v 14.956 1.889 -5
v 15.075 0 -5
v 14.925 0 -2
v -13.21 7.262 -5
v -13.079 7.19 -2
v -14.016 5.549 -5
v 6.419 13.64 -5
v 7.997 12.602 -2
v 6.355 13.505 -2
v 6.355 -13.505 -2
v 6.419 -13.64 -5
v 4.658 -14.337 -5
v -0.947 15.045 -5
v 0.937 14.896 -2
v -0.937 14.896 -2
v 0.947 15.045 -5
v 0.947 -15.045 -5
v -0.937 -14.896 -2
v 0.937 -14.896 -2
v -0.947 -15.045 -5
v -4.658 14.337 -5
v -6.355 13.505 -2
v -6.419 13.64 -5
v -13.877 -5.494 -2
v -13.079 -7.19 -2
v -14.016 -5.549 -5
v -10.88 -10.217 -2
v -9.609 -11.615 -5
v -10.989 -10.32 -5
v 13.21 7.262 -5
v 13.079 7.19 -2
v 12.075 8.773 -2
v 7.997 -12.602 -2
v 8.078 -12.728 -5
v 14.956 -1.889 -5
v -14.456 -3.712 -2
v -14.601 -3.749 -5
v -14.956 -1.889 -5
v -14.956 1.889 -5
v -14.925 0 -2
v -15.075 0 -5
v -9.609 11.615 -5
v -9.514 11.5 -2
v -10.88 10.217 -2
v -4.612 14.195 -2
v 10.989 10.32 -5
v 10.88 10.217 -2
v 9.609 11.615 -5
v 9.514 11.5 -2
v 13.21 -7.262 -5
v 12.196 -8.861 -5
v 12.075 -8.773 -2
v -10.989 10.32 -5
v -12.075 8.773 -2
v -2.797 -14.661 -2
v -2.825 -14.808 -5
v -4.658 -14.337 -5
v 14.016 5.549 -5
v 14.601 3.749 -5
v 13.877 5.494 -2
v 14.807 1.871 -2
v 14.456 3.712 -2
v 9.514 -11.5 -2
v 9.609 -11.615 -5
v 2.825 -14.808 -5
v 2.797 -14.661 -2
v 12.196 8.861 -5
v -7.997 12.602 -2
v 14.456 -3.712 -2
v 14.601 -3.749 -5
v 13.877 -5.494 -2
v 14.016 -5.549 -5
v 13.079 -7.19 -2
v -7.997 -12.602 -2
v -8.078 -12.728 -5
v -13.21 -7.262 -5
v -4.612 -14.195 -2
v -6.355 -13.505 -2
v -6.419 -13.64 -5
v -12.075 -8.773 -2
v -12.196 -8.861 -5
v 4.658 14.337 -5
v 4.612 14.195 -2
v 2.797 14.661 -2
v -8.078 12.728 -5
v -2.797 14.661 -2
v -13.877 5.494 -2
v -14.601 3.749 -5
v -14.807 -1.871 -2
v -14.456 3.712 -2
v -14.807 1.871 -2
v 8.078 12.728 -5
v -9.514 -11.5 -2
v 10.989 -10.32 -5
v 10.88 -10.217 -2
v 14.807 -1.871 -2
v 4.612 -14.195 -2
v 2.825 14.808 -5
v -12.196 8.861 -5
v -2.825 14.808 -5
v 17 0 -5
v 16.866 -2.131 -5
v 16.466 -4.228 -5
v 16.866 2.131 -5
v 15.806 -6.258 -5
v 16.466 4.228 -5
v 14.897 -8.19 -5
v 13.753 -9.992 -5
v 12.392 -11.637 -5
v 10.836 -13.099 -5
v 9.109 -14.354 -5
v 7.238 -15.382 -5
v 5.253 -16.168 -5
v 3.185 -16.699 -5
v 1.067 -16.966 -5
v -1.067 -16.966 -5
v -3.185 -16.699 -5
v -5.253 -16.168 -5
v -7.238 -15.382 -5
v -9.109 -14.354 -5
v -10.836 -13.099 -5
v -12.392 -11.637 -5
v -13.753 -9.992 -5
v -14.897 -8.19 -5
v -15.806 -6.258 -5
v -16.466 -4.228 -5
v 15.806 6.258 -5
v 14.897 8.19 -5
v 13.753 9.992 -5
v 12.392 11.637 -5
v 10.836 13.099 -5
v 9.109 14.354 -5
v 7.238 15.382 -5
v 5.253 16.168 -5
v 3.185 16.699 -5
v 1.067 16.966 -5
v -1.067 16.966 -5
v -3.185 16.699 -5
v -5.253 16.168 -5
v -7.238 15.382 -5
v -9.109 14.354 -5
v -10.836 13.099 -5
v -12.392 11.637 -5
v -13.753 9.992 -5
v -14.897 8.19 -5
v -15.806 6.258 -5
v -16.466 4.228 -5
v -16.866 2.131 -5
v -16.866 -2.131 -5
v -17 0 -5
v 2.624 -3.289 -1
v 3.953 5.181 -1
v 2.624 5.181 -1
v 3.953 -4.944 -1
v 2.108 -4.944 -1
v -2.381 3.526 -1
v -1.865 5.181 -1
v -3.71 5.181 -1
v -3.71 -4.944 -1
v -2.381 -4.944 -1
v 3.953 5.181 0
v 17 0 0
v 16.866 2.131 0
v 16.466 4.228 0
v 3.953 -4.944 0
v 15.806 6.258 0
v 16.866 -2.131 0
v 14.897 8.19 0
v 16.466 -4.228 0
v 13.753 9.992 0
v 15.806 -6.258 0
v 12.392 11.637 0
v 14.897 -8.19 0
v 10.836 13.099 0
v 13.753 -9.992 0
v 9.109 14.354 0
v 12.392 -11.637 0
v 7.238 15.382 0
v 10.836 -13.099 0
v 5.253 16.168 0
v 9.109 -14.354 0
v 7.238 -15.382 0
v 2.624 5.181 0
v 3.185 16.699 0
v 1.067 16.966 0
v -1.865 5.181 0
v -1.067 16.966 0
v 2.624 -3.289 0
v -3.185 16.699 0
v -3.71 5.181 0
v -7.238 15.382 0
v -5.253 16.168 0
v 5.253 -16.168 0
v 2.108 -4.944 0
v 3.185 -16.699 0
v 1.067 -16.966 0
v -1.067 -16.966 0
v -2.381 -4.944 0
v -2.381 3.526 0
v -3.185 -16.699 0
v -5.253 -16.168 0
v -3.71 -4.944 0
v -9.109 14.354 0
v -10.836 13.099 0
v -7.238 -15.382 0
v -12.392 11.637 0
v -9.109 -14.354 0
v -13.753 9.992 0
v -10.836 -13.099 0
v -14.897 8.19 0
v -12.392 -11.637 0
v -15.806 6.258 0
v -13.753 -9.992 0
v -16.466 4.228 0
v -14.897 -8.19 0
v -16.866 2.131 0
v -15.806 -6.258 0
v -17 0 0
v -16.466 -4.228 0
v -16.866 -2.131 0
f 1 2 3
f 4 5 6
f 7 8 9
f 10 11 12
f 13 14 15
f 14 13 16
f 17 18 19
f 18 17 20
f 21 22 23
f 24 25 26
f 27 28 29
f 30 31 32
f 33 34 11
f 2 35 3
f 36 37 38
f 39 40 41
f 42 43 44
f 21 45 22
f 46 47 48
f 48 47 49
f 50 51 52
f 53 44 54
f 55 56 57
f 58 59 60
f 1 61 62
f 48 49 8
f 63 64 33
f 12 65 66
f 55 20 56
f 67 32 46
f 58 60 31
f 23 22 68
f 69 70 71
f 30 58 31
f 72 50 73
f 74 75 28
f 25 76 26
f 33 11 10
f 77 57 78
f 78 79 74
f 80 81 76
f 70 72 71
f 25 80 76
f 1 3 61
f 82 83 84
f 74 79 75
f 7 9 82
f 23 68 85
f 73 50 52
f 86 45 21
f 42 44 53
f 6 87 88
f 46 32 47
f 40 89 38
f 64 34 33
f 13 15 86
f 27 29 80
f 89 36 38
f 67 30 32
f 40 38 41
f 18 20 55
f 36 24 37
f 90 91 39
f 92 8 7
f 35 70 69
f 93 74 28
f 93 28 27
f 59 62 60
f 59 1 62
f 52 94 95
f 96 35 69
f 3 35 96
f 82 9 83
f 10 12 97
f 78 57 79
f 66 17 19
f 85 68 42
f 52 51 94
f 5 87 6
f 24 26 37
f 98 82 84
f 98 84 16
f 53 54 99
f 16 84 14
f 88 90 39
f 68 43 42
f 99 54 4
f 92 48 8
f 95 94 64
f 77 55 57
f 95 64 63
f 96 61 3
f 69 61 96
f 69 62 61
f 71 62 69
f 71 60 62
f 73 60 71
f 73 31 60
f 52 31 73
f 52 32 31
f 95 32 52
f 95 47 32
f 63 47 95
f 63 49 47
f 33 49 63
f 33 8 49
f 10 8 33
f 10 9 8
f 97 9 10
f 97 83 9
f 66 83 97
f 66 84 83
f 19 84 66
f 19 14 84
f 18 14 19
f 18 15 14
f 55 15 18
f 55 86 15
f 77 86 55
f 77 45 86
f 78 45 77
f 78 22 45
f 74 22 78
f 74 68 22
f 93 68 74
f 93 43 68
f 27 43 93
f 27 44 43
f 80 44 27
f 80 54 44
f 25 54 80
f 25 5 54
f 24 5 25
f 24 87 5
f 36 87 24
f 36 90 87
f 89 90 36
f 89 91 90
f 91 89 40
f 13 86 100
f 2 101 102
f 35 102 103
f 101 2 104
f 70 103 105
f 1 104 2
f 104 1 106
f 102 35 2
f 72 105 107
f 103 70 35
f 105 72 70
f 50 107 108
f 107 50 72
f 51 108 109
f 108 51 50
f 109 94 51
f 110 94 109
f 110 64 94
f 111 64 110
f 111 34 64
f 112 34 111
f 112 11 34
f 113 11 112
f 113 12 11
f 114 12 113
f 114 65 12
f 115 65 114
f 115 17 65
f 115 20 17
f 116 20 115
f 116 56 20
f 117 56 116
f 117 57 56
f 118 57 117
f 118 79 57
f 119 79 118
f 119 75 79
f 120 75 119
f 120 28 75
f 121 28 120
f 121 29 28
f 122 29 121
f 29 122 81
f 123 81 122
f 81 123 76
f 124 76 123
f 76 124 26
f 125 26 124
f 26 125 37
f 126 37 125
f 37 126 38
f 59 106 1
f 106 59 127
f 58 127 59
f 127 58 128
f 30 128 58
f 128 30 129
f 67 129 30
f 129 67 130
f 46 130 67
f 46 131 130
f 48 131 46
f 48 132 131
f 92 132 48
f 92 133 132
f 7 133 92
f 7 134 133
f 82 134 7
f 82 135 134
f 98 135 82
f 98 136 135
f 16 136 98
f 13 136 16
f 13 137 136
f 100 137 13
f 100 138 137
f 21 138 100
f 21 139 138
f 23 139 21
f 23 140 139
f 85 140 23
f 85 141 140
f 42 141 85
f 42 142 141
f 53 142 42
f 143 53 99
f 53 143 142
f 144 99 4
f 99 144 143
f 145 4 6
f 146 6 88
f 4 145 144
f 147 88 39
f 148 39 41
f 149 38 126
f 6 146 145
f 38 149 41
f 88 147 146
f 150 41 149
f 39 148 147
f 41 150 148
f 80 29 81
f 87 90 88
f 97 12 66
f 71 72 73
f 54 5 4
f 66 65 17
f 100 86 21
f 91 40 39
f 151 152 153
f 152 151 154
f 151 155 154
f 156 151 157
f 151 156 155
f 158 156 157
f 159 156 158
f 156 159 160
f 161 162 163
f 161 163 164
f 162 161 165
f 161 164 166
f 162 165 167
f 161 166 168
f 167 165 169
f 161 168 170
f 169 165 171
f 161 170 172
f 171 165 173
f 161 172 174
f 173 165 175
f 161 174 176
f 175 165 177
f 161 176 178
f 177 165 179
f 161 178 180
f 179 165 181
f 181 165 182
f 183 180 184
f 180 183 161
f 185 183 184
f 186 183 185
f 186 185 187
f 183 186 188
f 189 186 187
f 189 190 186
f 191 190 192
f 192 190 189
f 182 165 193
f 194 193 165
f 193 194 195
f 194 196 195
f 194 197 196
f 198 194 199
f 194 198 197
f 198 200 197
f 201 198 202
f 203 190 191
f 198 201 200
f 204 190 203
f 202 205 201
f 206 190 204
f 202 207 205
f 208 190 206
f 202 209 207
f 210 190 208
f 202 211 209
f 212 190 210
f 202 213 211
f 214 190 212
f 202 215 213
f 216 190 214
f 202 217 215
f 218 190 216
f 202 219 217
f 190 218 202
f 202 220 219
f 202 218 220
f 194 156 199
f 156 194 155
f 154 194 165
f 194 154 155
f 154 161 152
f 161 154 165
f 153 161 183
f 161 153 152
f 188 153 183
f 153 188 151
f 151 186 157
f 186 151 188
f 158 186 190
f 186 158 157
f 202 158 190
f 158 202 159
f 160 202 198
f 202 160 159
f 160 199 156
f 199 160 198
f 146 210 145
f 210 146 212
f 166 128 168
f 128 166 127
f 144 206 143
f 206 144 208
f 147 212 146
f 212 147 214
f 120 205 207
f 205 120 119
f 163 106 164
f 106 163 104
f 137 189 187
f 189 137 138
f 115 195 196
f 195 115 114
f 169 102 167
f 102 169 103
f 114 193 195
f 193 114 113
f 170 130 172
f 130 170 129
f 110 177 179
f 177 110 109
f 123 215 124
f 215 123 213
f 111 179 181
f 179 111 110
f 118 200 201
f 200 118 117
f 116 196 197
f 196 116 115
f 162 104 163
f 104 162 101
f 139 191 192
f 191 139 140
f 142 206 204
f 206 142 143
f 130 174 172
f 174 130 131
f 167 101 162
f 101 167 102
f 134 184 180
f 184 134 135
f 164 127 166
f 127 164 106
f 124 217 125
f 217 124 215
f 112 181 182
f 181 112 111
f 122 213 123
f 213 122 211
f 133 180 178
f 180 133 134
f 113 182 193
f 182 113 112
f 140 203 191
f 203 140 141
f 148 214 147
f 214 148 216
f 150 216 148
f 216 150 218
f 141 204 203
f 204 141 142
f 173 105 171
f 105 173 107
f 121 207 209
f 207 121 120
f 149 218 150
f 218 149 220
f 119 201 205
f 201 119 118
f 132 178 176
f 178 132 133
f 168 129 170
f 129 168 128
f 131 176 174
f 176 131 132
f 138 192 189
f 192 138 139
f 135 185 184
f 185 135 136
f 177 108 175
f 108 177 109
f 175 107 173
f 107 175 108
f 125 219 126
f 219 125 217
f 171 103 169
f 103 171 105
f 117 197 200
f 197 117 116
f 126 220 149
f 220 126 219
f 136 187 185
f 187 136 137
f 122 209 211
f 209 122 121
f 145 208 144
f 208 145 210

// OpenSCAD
$fn = 50;

difference() {
	union() {
		translate(v = [0, 0, -5.0]) {
			cylinder(h = 5, r = 17.0);
		}
	}
	union() {
		#translate(v = [0, 0, -5.0]) {
			cylinder(h = 3, r1 = 15.075, r2 = 14.925);
		}
		translate(v = [0, 0, -1]) {
			linear_extrude(height = 1) {
				text(font = "Impact", halign = "center", size = 10, text = "N", valign = "center");
			}
		}
	}
}
